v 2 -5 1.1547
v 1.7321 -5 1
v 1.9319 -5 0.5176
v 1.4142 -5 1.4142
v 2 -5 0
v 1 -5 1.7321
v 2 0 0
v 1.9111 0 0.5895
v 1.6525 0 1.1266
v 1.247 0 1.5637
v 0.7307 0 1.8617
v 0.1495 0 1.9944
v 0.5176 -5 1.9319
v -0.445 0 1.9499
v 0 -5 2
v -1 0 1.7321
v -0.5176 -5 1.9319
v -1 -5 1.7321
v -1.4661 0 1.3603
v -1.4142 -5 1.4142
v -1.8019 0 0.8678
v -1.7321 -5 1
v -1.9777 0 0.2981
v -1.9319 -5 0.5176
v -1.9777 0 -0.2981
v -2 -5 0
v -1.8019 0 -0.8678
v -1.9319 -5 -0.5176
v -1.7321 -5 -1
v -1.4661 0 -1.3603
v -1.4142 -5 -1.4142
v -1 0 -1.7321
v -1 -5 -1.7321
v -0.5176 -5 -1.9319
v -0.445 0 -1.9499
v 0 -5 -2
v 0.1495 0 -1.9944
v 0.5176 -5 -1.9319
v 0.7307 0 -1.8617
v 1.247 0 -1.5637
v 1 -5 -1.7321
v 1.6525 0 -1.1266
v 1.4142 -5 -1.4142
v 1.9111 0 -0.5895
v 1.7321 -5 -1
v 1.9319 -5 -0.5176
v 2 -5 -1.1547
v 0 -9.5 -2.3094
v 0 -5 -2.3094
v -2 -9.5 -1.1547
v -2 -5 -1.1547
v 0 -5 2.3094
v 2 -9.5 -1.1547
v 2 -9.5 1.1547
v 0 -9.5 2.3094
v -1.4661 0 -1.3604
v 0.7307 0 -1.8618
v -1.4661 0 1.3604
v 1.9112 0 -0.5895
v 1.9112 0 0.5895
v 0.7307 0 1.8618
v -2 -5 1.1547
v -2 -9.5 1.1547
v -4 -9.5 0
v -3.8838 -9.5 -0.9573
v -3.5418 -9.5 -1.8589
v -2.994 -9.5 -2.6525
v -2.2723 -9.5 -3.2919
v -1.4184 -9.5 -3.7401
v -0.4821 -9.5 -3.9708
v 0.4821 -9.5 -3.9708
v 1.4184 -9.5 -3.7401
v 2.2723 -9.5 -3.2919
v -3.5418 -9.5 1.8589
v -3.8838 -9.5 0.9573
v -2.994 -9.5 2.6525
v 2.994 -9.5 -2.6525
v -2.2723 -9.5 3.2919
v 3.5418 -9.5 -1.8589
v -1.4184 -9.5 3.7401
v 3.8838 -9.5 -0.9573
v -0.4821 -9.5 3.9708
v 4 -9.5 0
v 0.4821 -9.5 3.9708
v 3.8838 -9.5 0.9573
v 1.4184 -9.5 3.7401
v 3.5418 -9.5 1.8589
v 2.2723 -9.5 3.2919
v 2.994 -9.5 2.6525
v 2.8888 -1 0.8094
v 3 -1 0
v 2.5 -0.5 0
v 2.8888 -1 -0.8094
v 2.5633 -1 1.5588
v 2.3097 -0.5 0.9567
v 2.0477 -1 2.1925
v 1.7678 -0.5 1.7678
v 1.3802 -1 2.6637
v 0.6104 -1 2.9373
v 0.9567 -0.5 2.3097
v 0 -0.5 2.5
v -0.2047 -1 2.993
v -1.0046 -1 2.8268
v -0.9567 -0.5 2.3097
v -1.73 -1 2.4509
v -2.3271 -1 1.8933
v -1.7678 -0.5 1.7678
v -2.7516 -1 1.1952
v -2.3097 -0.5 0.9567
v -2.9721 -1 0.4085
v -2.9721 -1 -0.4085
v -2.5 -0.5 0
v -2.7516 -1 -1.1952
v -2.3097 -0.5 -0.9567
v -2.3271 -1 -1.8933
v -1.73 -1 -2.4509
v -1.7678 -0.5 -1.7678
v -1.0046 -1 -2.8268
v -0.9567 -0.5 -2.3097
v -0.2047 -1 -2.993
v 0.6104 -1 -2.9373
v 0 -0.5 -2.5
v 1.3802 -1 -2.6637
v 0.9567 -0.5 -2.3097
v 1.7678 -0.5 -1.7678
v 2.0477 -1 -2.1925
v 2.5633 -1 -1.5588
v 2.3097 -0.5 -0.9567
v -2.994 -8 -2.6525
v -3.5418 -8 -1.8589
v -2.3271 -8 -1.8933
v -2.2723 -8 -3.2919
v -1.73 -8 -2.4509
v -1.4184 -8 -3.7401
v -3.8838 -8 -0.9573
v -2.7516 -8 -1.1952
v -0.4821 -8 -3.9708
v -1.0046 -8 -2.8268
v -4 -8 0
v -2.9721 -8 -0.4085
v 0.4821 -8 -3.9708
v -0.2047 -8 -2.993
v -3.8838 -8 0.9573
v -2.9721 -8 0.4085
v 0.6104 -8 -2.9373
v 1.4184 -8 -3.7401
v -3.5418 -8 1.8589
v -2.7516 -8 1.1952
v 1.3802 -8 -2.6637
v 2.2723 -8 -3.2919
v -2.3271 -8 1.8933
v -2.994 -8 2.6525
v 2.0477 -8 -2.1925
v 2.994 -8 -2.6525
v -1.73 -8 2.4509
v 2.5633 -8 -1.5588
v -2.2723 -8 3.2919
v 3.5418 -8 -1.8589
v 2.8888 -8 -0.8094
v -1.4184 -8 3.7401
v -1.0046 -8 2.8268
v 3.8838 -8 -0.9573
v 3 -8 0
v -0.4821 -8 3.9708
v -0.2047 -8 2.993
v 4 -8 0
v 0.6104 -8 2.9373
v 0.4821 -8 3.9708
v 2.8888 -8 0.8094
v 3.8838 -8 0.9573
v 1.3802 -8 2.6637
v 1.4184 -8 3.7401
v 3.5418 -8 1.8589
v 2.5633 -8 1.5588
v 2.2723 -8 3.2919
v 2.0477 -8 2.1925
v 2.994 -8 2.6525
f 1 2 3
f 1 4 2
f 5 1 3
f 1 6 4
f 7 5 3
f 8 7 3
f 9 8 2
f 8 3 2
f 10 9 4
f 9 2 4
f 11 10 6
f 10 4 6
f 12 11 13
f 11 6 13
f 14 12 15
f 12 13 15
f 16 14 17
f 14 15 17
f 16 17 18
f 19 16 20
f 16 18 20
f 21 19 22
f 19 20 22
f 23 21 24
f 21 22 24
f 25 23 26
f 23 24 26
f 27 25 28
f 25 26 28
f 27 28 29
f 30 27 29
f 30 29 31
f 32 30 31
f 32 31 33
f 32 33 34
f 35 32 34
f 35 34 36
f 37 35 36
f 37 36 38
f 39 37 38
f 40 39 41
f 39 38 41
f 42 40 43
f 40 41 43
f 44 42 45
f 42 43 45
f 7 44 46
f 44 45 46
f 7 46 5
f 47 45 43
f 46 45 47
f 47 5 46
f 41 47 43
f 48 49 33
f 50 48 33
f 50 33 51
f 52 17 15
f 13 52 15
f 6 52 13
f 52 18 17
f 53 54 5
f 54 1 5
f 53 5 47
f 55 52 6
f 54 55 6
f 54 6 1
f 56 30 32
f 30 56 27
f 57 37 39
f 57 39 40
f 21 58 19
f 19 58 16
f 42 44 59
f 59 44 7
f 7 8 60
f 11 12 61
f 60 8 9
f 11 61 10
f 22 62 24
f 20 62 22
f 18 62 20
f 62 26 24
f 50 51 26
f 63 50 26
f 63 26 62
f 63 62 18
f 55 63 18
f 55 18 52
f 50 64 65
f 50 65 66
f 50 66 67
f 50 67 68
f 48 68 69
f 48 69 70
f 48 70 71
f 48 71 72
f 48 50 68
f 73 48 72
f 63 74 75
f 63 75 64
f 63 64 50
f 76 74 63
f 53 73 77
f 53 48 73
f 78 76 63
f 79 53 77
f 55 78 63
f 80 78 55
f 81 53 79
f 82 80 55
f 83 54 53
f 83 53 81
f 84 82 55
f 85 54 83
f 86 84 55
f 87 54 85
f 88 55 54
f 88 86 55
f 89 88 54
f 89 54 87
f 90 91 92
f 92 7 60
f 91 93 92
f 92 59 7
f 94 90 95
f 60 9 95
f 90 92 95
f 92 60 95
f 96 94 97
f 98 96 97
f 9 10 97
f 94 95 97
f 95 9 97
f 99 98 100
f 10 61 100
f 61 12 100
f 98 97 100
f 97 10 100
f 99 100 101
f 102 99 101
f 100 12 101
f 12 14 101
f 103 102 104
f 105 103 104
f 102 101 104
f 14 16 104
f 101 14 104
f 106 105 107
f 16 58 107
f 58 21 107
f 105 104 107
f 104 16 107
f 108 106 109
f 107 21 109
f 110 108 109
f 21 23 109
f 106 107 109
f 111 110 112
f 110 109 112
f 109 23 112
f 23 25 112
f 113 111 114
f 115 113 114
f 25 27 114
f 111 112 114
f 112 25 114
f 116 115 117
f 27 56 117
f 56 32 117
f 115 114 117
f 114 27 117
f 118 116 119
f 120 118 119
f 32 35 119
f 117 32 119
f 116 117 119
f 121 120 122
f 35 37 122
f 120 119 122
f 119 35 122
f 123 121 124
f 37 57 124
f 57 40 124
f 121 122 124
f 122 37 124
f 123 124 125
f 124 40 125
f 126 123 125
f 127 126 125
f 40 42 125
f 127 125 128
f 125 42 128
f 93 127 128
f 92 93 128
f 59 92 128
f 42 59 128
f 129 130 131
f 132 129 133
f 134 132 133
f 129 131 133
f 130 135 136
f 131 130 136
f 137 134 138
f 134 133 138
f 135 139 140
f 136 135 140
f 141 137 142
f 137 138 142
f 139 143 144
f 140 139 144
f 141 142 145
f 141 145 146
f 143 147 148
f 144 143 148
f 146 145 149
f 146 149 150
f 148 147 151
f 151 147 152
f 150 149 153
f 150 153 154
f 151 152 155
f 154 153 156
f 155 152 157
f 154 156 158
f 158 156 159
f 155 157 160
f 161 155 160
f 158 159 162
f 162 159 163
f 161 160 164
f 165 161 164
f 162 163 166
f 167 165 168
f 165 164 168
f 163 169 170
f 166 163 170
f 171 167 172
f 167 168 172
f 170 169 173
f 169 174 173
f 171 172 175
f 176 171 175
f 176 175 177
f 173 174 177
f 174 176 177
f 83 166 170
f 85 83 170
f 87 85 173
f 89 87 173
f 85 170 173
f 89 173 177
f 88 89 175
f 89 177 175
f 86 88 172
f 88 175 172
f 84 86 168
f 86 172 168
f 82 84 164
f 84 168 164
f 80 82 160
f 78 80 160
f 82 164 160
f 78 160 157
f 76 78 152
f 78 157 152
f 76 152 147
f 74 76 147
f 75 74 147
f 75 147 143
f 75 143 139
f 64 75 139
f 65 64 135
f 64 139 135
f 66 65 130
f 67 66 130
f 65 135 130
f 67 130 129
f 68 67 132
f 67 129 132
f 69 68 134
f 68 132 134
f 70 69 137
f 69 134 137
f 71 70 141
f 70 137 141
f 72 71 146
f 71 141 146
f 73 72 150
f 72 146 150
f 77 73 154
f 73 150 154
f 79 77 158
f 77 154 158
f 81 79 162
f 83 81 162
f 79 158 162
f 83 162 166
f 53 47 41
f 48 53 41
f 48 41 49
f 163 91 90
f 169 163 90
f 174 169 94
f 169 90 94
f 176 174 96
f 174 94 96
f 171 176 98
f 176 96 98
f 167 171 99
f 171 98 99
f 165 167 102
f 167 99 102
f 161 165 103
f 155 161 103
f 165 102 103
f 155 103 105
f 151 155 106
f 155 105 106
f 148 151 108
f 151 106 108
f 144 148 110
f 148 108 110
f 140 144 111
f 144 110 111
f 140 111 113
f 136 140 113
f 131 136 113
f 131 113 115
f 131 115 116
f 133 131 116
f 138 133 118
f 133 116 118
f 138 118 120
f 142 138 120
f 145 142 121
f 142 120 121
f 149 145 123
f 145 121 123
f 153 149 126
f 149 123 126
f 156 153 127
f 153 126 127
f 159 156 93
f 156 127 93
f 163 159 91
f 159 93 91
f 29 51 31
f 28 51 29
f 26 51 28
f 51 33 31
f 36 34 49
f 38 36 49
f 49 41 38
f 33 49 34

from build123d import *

# Parameters (mm, degrees)
F0_R     = 3
F1_DEPTH = 8
F3_DEPTH = 3
F4_R     = 2
F5_DEPTH = 25
F6_SIZE  = 0.99999
F7_R     = 4
F8_DEPTH = 1.5


# Not quite as in the source:
# - a fillet or chamfer is up to 0.001 mm smaller than in the source, because OpenCascade refuses the exact size


with BuildPart() as f1:
    # F0 (on Front) → F1 (new body)
    with BuildSketch(Plane.XZ):
        Circle(F0_R)
    extrude(amount=F1_DEPTH)

    # F2 (on face) → F3 (cut)
    with BuildSketch(Plane.XZ.offset(8)):
        Polygon((2, 1.1547005384), (0, 2.3094010768), (-2, 1.1547005384), (-2, -1.1547005384), (0, -2.3094010768), (2, -1.1547005384), align=None)
    extrude(amount=-F3_DEPTH, mode=Mode.SUBTRACT)

    # F4 (on face) → F5 (cut)
    with BuildSketch(Plane.XZ.offset(5)):
        Circle(F4_R)
    extrude(amount=-F5_DEPTH, mode=Mode.SUBTRACT)

    # F6 (size 1 in the source; OpenCascade refuses exactly that, so slightly less here)
    f6_edges = [f1.edges().sort_by_distance(p)[0] for p in [
        (-3, 0, 0),
    ]]
    chamfer(f6_edges, length=F6_SIZE)

    # F7 (on face) → F8 (join)
    with BuildSketch(Plane.XZ.offset(8)):
        Circle(F7_R)
        Polygon((2, 1.1547005384), (2, -1.1547005384), (0, -2.3094010768), (-2, -1.1547005384), (-2, 1.1547005384), (0, 2.3094010768), align=None, mode=Mode.SUBTRACT)
    extrude(amount=F8_DEPTH)


solid = f1.part
